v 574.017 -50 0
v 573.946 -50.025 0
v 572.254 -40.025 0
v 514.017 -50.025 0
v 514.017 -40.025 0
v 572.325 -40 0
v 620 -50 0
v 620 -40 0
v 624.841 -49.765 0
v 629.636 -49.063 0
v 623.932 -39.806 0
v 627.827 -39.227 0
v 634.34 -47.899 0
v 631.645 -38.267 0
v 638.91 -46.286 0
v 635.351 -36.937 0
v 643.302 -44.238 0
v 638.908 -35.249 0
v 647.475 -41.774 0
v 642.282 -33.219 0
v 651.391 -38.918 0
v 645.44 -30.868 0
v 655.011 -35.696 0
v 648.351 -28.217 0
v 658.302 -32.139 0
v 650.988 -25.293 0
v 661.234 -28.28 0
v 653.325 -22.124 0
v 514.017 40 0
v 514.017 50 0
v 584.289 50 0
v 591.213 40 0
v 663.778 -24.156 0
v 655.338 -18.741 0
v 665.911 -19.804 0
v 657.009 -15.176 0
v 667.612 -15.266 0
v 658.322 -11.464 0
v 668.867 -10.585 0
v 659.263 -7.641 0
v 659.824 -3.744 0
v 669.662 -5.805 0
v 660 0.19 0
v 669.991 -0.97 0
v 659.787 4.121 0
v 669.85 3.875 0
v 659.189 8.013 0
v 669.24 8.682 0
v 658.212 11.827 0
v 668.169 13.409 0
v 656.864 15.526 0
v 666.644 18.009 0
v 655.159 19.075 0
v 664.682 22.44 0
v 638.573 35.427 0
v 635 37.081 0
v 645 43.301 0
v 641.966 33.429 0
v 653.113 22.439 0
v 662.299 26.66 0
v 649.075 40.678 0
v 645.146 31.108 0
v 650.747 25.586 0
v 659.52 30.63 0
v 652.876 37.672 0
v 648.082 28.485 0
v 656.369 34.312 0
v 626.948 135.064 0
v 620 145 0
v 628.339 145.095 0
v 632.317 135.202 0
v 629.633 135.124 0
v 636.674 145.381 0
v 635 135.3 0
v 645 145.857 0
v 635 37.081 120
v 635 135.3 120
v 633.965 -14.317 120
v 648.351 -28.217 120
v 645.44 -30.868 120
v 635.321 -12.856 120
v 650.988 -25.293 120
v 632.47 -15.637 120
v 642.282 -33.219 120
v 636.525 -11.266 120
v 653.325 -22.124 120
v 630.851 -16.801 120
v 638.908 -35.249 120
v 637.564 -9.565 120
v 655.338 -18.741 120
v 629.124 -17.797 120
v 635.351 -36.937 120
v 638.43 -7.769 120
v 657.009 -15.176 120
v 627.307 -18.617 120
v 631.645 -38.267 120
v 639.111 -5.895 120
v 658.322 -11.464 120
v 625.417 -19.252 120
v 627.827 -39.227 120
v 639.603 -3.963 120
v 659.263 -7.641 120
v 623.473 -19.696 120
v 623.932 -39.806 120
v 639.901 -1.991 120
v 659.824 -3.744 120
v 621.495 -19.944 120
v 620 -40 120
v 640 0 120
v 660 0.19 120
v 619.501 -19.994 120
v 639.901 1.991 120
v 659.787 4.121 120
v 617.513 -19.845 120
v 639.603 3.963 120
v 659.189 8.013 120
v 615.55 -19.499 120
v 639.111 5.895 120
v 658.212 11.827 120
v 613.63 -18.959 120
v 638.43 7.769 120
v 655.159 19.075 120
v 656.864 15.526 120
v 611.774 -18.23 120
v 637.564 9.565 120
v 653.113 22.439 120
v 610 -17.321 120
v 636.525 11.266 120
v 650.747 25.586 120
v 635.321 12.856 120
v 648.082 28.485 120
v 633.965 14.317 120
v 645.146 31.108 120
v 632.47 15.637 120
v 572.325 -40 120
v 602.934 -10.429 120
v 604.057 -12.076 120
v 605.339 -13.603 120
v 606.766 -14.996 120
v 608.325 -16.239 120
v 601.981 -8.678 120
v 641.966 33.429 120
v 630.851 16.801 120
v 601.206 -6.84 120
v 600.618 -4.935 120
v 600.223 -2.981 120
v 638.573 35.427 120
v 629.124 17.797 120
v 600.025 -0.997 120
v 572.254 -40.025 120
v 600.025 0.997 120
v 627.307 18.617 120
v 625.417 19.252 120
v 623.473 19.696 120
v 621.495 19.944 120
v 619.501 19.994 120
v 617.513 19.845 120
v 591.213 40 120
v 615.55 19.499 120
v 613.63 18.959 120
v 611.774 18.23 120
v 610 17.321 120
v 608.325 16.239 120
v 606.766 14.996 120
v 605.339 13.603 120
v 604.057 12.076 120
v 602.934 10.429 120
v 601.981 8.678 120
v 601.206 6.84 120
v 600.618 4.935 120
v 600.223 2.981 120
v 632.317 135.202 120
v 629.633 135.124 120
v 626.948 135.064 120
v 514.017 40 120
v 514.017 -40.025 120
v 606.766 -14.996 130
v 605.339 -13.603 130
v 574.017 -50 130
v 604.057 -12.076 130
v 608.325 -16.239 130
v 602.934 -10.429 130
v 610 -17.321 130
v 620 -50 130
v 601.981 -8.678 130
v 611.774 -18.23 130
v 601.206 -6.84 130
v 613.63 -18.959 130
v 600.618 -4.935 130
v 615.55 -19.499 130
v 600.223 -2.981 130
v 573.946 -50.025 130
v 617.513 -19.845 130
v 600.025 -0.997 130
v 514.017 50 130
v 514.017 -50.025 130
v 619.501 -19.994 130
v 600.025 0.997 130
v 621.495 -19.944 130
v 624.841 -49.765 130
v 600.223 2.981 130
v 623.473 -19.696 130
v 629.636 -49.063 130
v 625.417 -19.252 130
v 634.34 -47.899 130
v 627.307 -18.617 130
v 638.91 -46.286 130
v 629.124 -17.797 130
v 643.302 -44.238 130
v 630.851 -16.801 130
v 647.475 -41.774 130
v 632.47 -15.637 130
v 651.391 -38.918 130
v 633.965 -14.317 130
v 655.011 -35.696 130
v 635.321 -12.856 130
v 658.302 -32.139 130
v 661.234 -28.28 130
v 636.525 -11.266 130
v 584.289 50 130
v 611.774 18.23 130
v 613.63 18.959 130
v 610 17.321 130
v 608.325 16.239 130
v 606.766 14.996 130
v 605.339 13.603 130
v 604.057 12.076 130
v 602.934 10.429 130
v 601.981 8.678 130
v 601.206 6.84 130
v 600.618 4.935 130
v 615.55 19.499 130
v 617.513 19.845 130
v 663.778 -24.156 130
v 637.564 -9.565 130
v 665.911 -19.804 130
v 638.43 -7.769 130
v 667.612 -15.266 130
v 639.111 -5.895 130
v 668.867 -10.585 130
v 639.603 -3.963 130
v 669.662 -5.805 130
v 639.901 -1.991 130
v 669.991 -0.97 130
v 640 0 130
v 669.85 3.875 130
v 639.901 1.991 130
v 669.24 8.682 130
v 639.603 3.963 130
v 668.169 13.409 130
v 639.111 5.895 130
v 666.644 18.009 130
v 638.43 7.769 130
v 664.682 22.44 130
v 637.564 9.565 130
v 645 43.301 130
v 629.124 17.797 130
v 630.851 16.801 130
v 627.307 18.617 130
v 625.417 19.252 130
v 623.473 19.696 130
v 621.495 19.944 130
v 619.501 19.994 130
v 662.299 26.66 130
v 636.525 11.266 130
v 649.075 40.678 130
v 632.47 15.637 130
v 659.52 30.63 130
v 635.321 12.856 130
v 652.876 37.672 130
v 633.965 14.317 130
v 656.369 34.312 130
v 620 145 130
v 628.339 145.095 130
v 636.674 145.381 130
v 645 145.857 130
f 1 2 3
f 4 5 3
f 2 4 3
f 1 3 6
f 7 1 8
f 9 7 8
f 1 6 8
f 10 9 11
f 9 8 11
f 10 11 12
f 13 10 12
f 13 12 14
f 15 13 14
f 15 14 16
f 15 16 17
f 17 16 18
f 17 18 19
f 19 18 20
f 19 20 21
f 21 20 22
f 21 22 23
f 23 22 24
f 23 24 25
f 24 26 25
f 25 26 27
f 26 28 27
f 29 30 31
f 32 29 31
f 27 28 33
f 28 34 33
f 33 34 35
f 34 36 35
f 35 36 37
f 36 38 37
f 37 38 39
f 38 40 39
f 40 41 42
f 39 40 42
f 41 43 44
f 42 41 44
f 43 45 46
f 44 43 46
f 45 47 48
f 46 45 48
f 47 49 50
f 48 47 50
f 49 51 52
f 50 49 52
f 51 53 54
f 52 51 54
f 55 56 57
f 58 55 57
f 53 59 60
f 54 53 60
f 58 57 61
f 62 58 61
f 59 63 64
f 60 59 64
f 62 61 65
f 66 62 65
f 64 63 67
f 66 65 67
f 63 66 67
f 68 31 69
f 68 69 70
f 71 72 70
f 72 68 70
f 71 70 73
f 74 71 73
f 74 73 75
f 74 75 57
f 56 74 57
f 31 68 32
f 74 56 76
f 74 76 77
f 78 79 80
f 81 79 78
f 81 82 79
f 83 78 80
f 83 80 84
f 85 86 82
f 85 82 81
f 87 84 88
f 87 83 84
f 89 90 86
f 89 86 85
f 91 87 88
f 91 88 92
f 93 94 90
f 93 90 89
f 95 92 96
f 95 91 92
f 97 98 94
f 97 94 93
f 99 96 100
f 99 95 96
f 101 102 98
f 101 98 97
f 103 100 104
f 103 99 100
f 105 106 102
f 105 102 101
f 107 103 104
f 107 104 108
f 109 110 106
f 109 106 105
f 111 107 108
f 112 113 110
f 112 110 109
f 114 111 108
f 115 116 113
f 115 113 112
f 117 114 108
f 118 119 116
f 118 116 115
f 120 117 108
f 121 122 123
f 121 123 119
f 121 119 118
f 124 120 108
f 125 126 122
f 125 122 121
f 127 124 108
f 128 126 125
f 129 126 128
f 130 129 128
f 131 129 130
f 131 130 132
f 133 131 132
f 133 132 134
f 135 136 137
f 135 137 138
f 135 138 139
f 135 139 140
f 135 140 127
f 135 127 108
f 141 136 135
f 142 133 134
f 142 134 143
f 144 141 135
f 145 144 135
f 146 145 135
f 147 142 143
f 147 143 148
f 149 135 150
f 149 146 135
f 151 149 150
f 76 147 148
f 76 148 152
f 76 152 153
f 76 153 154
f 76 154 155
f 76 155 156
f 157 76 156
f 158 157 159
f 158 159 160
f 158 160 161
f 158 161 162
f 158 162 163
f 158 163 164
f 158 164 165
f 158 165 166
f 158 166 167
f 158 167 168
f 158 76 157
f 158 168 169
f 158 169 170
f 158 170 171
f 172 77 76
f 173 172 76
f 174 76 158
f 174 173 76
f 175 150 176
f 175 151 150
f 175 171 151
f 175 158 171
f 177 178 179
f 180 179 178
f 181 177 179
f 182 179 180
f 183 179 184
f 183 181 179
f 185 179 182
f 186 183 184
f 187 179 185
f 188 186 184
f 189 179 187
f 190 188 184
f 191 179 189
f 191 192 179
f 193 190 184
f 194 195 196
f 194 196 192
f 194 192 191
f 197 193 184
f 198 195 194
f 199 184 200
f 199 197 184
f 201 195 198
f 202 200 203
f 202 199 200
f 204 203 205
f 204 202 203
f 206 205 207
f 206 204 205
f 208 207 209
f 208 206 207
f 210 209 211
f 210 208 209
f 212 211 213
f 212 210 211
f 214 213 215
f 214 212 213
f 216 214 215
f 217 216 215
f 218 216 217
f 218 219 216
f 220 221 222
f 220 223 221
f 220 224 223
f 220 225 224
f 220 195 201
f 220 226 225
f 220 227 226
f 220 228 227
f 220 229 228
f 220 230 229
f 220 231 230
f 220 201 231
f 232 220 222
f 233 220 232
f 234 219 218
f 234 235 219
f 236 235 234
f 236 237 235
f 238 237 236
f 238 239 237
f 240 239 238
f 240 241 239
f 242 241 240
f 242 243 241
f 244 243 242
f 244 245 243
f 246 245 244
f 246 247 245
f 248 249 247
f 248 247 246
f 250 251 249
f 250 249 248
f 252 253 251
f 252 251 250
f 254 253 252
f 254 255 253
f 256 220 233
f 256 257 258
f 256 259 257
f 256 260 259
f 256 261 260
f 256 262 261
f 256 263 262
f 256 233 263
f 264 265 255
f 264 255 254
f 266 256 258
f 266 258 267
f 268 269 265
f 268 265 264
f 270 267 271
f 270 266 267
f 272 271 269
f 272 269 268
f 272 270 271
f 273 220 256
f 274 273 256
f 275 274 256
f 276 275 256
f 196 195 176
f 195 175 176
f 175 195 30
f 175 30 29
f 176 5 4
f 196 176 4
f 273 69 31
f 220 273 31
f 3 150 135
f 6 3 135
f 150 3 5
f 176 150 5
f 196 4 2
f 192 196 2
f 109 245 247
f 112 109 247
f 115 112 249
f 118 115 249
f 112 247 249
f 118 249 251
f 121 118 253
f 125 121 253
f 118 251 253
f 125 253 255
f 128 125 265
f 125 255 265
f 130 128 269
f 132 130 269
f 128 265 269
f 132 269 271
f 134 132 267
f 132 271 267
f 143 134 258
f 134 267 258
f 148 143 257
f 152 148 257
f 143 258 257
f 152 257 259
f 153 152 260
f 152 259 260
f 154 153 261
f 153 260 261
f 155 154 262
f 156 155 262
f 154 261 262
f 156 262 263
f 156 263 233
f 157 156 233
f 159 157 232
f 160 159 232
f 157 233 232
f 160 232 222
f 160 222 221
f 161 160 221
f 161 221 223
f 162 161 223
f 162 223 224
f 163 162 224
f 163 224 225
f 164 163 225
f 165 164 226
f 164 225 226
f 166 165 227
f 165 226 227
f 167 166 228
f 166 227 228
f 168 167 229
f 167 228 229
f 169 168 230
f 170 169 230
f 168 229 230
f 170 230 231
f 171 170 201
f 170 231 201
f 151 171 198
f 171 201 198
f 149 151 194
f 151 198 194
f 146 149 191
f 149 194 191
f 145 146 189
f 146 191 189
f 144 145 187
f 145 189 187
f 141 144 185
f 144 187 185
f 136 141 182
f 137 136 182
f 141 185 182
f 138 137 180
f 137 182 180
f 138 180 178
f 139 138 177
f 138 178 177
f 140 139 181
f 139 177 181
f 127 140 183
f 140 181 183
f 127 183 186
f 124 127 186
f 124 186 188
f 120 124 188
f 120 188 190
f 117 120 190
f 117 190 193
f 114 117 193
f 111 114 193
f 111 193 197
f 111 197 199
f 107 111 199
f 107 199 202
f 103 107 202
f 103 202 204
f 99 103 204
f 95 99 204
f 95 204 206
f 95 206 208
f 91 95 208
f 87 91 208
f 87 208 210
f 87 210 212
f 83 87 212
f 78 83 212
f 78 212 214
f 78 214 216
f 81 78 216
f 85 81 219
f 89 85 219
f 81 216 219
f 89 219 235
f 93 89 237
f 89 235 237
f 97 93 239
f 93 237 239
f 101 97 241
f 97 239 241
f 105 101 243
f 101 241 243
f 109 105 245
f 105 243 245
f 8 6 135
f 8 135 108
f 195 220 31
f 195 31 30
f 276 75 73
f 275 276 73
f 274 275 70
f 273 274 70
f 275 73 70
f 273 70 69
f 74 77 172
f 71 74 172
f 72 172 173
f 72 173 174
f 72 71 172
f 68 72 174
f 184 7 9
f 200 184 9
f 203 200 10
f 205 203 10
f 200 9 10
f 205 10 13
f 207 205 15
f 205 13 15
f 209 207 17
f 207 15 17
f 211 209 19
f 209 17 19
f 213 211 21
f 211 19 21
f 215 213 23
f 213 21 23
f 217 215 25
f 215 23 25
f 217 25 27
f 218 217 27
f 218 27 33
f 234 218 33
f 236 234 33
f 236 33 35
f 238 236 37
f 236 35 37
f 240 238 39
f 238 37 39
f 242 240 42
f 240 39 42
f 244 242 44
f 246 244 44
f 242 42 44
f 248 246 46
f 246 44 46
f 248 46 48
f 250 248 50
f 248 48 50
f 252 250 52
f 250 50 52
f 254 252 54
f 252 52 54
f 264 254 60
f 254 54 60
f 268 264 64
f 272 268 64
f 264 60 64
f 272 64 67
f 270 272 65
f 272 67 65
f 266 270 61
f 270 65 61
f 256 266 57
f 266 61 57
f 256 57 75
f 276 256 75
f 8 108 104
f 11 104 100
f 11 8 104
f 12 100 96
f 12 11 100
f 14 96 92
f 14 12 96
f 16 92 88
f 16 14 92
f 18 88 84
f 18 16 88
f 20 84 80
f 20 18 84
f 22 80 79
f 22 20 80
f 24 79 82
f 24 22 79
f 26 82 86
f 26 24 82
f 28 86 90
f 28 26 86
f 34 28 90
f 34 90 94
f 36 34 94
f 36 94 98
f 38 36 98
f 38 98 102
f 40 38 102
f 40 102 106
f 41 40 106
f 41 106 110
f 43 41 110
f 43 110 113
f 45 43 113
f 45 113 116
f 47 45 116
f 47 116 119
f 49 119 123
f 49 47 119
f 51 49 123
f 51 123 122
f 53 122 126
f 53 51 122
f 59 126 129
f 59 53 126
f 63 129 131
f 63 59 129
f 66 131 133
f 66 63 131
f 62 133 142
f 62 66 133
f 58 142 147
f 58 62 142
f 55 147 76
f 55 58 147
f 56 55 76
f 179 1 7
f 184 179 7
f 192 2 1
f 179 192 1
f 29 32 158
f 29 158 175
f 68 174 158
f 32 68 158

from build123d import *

# Parameters (mm, degrees)
EXTRUDE_1_DEPTH     = 130
SHELL_2_T           = -10
SKETCH_2_W          = 10
SKETCH_2_H          = 80.0247511
CUT_EXTRUDE_1_DEPTH = 120
SKETCH_3_R          = 20
CUT_EXTRUDE_2_DEPTH = 10


with BuildPart() as part:
    # 草图1 → 凸台-拉伸1 (new body)
    with BuildSketch(Plane.XY):
        with BuildLine():
            Line((574.017492235, -50), (620, -50))
            ThreePointArc((620, -50), (668.296291314, -12.940952255), (645, 43.301270189))
            Line((645, 43.301270189), (645, 145.857170879))
            ThreePointArc((645, 145.857170879), (632.507345261, 145.214355663), (620, 145))
            Line((620, 145), (584.288816548, 50))
            Line((584.288816548, 50), (514.017492235, 50))
            Line((514.017492235, 50), (514.017492235, 22.675903866))
            Line((514.017492235, 22.675903866), (514.017492235, -50.0247511))
            Line((514.017492235, -50.0247511), (573.94648172, -50.0247511))
            Line((573.94648172, -50.0247511), (574.017492235, -50))
        make_face()
    extrude(amount=EXTRUDE_1_DEPTH)

    # 抽壳2
    shell_2_openings = [part.faces().sort_by_distance(p)[0] for p in [
        (594.932550523, 20.025269894, 0),
    ]]
    offset(amount=SHELL_2_T, openings=shell_2_openings, kind=Kind.INTERSECTION)

    # 草图2 → 切除-拉伸1 (cut)
    with BuildSketch(Plane(origin=(0, 0, 0), x_dir=(-1, 0, 0), z_dir=(0, 0, -1))):
        with Locations((-519.017492235, -0.01237555)):
            Rectangle(SKETCH_2_W, SKETCH_2_H)
    extrude(amount=-CUT_EXTRUDE_1_DEPTH, mode=Mode.SUBTRACT)

    # 草图3 → 切除-拉伸2 (cut)
    with BuildSketch(Plane.XY.offset(130)):
        with Locations((620, 0)):
            Circle(SKETCH_3_R)
    extrude(amount=-CUT_EXTRUDE_2_DEPTH, mode=Mode.SUBTRACT)


solid = part.part
